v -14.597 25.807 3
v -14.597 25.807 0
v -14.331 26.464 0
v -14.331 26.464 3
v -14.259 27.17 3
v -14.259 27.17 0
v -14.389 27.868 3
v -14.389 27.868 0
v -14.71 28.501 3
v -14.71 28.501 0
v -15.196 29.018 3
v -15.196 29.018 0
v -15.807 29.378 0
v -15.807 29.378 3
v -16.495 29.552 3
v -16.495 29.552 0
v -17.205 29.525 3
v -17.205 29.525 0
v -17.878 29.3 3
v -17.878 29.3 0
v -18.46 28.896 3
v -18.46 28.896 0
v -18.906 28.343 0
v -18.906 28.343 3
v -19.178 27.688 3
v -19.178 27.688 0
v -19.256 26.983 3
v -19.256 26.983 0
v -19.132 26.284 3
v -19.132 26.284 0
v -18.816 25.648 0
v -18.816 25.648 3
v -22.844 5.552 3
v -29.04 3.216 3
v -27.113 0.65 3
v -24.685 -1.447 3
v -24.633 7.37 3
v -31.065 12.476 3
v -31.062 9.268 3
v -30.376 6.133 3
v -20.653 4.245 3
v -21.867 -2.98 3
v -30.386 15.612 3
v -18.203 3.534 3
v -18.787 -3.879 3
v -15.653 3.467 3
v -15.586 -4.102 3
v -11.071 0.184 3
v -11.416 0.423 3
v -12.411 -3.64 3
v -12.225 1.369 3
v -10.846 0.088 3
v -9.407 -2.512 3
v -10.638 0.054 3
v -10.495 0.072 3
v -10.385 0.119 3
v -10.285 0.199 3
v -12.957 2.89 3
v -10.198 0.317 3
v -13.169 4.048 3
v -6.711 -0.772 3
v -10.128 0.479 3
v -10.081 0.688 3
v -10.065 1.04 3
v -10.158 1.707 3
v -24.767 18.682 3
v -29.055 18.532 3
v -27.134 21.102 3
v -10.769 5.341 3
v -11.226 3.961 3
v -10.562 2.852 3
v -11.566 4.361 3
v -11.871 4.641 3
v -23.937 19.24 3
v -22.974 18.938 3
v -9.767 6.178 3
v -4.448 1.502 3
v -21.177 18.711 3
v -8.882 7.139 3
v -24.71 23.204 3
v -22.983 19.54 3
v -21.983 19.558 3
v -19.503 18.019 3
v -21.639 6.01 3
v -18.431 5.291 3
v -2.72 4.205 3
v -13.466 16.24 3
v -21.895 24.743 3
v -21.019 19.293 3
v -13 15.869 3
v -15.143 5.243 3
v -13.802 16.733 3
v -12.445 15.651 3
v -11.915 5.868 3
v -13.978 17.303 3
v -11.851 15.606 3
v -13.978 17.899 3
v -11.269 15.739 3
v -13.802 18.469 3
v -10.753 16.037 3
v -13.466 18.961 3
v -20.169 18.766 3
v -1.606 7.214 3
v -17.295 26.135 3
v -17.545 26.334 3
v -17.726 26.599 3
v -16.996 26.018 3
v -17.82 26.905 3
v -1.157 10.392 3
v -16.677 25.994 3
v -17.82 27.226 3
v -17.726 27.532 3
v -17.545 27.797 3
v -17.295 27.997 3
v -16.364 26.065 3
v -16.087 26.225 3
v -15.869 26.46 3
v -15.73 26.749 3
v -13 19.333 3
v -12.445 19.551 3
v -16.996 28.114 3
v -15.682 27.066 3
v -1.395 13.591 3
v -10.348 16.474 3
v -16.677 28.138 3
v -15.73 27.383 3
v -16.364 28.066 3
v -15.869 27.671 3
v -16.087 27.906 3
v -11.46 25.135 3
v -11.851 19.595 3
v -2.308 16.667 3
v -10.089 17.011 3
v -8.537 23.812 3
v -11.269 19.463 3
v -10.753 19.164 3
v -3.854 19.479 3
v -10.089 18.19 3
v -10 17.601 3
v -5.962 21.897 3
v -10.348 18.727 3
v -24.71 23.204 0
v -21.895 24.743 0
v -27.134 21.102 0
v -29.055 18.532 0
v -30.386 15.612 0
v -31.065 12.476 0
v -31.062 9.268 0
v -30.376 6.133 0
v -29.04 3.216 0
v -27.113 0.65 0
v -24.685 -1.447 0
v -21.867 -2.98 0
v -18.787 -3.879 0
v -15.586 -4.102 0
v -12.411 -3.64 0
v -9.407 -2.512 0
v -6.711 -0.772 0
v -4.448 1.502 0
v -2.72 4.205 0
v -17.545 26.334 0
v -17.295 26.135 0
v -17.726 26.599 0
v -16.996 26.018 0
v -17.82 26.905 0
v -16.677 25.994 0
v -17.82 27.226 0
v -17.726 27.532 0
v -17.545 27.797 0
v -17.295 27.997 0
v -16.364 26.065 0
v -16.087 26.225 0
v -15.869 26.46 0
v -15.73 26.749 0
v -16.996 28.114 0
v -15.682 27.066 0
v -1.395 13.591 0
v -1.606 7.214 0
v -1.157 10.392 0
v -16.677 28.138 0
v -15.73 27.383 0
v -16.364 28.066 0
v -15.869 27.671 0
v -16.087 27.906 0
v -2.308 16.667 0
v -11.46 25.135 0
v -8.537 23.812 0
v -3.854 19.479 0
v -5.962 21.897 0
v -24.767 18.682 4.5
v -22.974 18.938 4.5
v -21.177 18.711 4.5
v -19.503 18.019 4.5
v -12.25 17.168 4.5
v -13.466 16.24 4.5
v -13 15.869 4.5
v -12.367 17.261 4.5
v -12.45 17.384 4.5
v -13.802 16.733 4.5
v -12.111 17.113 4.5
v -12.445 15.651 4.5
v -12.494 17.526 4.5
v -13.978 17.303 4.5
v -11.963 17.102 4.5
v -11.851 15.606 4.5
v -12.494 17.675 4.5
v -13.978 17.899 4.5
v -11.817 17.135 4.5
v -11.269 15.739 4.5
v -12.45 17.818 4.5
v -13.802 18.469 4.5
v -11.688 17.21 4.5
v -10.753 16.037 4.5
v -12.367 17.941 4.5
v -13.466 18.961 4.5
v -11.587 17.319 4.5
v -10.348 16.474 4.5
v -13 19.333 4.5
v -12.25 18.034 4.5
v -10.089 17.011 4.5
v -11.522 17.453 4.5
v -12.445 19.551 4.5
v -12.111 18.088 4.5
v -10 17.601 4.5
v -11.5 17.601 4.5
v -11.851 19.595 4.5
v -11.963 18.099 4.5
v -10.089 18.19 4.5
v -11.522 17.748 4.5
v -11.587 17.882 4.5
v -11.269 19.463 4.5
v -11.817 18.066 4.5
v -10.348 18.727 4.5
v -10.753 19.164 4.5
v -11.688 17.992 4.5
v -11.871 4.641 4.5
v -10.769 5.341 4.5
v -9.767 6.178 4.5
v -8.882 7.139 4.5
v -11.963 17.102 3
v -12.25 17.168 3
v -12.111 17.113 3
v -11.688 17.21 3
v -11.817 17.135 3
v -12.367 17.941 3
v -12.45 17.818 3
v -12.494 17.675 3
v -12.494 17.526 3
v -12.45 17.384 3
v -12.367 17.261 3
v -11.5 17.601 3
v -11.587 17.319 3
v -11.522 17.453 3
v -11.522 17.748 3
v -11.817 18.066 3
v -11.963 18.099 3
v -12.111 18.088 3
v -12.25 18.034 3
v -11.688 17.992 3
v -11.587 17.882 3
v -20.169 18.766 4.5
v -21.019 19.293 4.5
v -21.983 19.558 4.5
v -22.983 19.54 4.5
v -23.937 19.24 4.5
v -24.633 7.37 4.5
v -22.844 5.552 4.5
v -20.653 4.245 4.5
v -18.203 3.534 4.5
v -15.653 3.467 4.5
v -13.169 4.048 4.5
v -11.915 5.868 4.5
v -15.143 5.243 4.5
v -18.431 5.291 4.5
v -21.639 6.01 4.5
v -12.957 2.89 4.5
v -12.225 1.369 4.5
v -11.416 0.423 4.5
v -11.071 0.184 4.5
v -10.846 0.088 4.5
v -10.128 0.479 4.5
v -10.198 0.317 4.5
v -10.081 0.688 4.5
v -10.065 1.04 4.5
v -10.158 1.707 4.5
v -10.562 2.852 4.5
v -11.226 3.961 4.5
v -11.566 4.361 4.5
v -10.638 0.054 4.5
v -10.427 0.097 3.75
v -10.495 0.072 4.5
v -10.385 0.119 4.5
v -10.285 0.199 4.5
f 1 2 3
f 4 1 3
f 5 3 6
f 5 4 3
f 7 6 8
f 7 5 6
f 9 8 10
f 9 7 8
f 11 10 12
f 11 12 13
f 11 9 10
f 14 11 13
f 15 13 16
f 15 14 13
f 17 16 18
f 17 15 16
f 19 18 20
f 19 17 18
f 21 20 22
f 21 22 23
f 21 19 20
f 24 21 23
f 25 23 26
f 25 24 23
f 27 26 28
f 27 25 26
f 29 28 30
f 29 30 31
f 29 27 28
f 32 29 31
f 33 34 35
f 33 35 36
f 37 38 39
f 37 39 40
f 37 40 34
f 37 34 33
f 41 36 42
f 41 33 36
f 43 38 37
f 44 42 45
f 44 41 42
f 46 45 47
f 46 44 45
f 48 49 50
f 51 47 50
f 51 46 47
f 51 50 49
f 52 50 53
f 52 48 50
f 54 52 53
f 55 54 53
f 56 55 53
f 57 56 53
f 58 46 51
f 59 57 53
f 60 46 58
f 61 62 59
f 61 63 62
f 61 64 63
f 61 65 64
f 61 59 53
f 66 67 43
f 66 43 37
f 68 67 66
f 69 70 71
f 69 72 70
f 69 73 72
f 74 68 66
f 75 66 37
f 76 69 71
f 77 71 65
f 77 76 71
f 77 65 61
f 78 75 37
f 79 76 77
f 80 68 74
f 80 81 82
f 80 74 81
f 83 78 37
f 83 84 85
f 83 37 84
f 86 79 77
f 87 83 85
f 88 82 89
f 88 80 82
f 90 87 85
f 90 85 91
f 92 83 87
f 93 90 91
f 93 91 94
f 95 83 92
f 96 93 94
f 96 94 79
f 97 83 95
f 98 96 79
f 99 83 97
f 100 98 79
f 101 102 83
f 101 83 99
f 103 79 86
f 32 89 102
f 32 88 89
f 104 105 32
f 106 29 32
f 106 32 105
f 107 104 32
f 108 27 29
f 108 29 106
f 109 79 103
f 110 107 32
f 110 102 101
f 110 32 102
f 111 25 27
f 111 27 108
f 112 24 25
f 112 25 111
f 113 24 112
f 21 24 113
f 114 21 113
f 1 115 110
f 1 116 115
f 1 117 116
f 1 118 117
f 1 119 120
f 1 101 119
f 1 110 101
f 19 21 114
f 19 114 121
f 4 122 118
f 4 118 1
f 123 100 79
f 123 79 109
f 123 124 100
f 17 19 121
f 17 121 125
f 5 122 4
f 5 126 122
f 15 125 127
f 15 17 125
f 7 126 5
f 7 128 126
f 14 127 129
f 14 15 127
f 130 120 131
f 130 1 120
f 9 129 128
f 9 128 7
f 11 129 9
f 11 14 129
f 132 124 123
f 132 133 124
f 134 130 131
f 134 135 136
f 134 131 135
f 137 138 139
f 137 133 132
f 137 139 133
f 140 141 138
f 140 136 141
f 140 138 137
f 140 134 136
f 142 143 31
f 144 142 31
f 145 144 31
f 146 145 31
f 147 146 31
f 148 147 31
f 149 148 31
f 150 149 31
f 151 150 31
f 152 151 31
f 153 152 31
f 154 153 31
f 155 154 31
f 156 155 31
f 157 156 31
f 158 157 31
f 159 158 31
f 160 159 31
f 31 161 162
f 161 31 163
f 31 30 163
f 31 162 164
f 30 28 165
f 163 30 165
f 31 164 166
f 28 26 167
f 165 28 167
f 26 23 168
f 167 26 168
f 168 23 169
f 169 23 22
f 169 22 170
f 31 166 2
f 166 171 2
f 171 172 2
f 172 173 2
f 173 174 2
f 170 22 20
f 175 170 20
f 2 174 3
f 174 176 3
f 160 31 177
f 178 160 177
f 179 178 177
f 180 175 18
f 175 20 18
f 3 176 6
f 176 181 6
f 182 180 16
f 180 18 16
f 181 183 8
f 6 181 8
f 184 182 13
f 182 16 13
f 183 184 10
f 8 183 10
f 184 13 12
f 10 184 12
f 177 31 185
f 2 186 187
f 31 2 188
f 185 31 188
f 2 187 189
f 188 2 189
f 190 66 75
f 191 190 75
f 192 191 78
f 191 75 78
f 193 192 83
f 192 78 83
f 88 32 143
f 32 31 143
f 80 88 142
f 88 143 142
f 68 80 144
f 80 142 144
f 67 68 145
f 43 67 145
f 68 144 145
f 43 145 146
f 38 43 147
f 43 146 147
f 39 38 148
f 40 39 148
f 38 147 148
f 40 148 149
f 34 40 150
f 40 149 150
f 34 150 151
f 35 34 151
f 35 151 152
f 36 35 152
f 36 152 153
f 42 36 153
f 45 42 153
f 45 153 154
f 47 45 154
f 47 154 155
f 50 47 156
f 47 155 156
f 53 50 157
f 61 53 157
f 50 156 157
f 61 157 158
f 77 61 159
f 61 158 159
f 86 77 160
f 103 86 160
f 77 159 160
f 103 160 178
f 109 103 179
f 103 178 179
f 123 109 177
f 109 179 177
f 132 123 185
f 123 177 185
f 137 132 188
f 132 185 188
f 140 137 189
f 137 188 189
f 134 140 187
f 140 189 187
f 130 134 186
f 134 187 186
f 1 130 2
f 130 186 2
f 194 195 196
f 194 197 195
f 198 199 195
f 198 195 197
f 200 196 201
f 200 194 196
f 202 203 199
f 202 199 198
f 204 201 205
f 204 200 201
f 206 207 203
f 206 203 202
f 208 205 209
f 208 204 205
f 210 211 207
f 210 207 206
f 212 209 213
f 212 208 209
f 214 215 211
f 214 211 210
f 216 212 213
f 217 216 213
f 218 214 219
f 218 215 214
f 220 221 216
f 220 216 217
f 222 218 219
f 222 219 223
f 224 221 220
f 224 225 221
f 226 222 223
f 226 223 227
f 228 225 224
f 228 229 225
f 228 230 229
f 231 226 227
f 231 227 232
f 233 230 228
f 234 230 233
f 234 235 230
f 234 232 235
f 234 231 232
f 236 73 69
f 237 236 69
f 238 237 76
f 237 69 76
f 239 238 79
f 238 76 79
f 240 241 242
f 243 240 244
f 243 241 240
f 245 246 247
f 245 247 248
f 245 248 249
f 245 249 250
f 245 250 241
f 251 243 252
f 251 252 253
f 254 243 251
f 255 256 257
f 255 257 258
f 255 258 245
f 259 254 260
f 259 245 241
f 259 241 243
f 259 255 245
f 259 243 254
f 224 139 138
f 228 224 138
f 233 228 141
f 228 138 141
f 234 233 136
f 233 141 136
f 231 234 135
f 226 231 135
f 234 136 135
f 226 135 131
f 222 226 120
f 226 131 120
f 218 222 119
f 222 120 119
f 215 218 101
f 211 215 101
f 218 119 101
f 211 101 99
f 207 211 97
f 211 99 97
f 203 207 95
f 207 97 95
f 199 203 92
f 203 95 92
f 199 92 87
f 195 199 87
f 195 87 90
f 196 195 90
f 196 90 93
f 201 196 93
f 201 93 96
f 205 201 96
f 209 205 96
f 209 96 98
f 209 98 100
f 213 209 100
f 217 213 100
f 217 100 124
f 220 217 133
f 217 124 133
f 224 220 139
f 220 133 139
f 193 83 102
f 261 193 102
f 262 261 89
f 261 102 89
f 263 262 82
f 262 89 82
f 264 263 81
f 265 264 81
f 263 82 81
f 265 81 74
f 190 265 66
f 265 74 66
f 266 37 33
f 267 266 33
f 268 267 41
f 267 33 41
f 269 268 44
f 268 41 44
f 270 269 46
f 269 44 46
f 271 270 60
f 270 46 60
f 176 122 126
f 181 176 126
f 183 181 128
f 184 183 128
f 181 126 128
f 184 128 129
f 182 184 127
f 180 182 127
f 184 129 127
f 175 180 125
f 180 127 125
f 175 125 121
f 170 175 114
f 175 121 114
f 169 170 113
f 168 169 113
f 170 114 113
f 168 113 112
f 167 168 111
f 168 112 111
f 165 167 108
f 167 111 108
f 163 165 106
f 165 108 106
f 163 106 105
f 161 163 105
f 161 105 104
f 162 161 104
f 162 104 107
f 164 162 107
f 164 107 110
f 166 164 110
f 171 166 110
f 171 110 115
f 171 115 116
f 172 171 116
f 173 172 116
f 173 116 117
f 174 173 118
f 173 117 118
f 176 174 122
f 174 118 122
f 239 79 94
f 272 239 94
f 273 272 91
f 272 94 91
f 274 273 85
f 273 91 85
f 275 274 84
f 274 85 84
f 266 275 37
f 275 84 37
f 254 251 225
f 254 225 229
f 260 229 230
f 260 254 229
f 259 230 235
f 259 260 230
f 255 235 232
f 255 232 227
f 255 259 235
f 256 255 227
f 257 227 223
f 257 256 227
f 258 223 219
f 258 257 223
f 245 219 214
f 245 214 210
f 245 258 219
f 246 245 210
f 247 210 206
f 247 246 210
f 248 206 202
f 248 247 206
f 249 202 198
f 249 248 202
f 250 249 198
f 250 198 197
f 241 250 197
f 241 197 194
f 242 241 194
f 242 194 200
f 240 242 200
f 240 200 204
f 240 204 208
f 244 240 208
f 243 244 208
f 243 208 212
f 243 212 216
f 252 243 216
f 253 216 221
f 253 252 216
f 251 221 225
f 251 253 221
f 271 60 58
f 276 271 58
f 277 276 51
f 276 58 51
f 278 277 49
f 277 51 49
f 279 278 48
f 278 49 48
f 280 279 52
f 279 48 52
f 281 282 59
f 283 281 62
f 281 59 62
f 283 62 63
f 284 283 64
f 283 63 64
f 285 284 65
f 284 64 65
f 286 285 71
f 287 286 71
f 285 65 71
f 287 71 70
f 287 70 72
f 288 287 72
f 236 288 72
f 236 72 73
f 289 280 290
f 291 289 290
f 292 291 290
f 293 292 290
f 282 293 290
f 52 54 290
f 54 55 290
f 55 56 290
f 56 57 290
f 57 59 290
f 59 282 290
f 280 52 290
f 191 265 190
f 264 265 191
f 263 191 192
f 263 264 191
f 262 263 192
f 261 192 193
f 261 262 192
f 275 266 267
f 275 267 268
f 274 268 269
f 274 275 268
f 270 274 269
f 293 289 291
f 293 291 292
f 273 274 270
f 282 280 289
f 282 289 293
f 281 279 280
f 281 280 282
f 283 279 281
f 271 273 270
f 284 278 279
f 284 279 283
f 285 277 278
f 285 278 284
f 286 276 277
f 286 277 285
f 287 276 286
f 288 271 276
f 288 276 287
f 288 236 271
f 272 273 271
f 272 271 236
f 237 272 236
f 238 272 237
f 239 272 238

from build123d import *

# Parameters (mm, degrees)
F0_R     = 15
F1_DEPTH = 3
F2_R     = 2
F2_R_2   = 0.5
F3_DEPTH = 1.5
F4_R     = 2.5
F4_R_2   = 1.075
F5_DEPTH = 3


with BuildPart() as f1:
    # F0 (on Top) → F1 (new body)
    with BuildSketch(Plane.XY):
        with Locations((-16.1491949111, 10.887096636)):
            Circle(F0_R)
    extrude(amount=F1_DEPTH)

    # F2 (on face) → F3 (join)
    with BuildSketch(Plane.XY.offset(3)):
        with Locations((-12, 17.6008082926)):
            Circle(F2_R)
        with Locations((-12, 17.6008082926)):
            Circle(F2_R_2, mode=Mode.SUBTRACT)
        with BuildLine():
            ThreePointArc((-8.8824603224, 7.1392940688), (-16.7881056428, 5.1821903468), (-24.6329733241, 7.3702337589))
            ThreePointArc((-24.6329733241, 7.3702337589), (-19.4510459053, 3.8110892822), (-13.1690173954, 4.0477303202))
            add(Edge.make_bspline(
                [(-13.1690173954, 4.0477303202), (-13.1362154253, -1.1413398729), (-10.427309312, 0.097086679), (-7.7184031986, 1.335513231), (-11.8713523396, 4.6409819109)],
                knots=[3.8341028208, 3.8341028208, 3.8341028208, 6.2689537824, 6.2689537824, 8.7038047441, 8.7038047441, 8.7038047441], degree=2, weights=[1, 0.3460623341, 1, 0.3460623341, 1]))
            ThreePointArc((-11.8713523396, 4.6409819109), (-10.254077445, 5.743189869), (-8.8824603224, 7.1392940688))
        make_face()
        with BuildLine():
            ThreePointArc((-24.7671979005, 18.6823099732), (-22.0677226207, 18.8845619079), (-19.5026847059, 18.0193144708))
            ThreePointArc((-19.5026847059, 18.0193144708), (-21.9828567976, 19.558438644), (-24.7671979005, 18.6823099732))
        make_face()
    extrude(amount=F3_DEPTH)

    # F4 (on face) → F5 (join)
    with BuildSketch(Plane.XY.offset(3)):
        with Locations((-16.757108611, 27.0656452758)):
            Circle(F4_R)
        with Locations((-16.757108611, 27.0656452758)):
            Circle(F4_R_2, mode=Mode.SUBTRACT)
    extrude(amount=-F5_DEPTH)


solid = f1.part
